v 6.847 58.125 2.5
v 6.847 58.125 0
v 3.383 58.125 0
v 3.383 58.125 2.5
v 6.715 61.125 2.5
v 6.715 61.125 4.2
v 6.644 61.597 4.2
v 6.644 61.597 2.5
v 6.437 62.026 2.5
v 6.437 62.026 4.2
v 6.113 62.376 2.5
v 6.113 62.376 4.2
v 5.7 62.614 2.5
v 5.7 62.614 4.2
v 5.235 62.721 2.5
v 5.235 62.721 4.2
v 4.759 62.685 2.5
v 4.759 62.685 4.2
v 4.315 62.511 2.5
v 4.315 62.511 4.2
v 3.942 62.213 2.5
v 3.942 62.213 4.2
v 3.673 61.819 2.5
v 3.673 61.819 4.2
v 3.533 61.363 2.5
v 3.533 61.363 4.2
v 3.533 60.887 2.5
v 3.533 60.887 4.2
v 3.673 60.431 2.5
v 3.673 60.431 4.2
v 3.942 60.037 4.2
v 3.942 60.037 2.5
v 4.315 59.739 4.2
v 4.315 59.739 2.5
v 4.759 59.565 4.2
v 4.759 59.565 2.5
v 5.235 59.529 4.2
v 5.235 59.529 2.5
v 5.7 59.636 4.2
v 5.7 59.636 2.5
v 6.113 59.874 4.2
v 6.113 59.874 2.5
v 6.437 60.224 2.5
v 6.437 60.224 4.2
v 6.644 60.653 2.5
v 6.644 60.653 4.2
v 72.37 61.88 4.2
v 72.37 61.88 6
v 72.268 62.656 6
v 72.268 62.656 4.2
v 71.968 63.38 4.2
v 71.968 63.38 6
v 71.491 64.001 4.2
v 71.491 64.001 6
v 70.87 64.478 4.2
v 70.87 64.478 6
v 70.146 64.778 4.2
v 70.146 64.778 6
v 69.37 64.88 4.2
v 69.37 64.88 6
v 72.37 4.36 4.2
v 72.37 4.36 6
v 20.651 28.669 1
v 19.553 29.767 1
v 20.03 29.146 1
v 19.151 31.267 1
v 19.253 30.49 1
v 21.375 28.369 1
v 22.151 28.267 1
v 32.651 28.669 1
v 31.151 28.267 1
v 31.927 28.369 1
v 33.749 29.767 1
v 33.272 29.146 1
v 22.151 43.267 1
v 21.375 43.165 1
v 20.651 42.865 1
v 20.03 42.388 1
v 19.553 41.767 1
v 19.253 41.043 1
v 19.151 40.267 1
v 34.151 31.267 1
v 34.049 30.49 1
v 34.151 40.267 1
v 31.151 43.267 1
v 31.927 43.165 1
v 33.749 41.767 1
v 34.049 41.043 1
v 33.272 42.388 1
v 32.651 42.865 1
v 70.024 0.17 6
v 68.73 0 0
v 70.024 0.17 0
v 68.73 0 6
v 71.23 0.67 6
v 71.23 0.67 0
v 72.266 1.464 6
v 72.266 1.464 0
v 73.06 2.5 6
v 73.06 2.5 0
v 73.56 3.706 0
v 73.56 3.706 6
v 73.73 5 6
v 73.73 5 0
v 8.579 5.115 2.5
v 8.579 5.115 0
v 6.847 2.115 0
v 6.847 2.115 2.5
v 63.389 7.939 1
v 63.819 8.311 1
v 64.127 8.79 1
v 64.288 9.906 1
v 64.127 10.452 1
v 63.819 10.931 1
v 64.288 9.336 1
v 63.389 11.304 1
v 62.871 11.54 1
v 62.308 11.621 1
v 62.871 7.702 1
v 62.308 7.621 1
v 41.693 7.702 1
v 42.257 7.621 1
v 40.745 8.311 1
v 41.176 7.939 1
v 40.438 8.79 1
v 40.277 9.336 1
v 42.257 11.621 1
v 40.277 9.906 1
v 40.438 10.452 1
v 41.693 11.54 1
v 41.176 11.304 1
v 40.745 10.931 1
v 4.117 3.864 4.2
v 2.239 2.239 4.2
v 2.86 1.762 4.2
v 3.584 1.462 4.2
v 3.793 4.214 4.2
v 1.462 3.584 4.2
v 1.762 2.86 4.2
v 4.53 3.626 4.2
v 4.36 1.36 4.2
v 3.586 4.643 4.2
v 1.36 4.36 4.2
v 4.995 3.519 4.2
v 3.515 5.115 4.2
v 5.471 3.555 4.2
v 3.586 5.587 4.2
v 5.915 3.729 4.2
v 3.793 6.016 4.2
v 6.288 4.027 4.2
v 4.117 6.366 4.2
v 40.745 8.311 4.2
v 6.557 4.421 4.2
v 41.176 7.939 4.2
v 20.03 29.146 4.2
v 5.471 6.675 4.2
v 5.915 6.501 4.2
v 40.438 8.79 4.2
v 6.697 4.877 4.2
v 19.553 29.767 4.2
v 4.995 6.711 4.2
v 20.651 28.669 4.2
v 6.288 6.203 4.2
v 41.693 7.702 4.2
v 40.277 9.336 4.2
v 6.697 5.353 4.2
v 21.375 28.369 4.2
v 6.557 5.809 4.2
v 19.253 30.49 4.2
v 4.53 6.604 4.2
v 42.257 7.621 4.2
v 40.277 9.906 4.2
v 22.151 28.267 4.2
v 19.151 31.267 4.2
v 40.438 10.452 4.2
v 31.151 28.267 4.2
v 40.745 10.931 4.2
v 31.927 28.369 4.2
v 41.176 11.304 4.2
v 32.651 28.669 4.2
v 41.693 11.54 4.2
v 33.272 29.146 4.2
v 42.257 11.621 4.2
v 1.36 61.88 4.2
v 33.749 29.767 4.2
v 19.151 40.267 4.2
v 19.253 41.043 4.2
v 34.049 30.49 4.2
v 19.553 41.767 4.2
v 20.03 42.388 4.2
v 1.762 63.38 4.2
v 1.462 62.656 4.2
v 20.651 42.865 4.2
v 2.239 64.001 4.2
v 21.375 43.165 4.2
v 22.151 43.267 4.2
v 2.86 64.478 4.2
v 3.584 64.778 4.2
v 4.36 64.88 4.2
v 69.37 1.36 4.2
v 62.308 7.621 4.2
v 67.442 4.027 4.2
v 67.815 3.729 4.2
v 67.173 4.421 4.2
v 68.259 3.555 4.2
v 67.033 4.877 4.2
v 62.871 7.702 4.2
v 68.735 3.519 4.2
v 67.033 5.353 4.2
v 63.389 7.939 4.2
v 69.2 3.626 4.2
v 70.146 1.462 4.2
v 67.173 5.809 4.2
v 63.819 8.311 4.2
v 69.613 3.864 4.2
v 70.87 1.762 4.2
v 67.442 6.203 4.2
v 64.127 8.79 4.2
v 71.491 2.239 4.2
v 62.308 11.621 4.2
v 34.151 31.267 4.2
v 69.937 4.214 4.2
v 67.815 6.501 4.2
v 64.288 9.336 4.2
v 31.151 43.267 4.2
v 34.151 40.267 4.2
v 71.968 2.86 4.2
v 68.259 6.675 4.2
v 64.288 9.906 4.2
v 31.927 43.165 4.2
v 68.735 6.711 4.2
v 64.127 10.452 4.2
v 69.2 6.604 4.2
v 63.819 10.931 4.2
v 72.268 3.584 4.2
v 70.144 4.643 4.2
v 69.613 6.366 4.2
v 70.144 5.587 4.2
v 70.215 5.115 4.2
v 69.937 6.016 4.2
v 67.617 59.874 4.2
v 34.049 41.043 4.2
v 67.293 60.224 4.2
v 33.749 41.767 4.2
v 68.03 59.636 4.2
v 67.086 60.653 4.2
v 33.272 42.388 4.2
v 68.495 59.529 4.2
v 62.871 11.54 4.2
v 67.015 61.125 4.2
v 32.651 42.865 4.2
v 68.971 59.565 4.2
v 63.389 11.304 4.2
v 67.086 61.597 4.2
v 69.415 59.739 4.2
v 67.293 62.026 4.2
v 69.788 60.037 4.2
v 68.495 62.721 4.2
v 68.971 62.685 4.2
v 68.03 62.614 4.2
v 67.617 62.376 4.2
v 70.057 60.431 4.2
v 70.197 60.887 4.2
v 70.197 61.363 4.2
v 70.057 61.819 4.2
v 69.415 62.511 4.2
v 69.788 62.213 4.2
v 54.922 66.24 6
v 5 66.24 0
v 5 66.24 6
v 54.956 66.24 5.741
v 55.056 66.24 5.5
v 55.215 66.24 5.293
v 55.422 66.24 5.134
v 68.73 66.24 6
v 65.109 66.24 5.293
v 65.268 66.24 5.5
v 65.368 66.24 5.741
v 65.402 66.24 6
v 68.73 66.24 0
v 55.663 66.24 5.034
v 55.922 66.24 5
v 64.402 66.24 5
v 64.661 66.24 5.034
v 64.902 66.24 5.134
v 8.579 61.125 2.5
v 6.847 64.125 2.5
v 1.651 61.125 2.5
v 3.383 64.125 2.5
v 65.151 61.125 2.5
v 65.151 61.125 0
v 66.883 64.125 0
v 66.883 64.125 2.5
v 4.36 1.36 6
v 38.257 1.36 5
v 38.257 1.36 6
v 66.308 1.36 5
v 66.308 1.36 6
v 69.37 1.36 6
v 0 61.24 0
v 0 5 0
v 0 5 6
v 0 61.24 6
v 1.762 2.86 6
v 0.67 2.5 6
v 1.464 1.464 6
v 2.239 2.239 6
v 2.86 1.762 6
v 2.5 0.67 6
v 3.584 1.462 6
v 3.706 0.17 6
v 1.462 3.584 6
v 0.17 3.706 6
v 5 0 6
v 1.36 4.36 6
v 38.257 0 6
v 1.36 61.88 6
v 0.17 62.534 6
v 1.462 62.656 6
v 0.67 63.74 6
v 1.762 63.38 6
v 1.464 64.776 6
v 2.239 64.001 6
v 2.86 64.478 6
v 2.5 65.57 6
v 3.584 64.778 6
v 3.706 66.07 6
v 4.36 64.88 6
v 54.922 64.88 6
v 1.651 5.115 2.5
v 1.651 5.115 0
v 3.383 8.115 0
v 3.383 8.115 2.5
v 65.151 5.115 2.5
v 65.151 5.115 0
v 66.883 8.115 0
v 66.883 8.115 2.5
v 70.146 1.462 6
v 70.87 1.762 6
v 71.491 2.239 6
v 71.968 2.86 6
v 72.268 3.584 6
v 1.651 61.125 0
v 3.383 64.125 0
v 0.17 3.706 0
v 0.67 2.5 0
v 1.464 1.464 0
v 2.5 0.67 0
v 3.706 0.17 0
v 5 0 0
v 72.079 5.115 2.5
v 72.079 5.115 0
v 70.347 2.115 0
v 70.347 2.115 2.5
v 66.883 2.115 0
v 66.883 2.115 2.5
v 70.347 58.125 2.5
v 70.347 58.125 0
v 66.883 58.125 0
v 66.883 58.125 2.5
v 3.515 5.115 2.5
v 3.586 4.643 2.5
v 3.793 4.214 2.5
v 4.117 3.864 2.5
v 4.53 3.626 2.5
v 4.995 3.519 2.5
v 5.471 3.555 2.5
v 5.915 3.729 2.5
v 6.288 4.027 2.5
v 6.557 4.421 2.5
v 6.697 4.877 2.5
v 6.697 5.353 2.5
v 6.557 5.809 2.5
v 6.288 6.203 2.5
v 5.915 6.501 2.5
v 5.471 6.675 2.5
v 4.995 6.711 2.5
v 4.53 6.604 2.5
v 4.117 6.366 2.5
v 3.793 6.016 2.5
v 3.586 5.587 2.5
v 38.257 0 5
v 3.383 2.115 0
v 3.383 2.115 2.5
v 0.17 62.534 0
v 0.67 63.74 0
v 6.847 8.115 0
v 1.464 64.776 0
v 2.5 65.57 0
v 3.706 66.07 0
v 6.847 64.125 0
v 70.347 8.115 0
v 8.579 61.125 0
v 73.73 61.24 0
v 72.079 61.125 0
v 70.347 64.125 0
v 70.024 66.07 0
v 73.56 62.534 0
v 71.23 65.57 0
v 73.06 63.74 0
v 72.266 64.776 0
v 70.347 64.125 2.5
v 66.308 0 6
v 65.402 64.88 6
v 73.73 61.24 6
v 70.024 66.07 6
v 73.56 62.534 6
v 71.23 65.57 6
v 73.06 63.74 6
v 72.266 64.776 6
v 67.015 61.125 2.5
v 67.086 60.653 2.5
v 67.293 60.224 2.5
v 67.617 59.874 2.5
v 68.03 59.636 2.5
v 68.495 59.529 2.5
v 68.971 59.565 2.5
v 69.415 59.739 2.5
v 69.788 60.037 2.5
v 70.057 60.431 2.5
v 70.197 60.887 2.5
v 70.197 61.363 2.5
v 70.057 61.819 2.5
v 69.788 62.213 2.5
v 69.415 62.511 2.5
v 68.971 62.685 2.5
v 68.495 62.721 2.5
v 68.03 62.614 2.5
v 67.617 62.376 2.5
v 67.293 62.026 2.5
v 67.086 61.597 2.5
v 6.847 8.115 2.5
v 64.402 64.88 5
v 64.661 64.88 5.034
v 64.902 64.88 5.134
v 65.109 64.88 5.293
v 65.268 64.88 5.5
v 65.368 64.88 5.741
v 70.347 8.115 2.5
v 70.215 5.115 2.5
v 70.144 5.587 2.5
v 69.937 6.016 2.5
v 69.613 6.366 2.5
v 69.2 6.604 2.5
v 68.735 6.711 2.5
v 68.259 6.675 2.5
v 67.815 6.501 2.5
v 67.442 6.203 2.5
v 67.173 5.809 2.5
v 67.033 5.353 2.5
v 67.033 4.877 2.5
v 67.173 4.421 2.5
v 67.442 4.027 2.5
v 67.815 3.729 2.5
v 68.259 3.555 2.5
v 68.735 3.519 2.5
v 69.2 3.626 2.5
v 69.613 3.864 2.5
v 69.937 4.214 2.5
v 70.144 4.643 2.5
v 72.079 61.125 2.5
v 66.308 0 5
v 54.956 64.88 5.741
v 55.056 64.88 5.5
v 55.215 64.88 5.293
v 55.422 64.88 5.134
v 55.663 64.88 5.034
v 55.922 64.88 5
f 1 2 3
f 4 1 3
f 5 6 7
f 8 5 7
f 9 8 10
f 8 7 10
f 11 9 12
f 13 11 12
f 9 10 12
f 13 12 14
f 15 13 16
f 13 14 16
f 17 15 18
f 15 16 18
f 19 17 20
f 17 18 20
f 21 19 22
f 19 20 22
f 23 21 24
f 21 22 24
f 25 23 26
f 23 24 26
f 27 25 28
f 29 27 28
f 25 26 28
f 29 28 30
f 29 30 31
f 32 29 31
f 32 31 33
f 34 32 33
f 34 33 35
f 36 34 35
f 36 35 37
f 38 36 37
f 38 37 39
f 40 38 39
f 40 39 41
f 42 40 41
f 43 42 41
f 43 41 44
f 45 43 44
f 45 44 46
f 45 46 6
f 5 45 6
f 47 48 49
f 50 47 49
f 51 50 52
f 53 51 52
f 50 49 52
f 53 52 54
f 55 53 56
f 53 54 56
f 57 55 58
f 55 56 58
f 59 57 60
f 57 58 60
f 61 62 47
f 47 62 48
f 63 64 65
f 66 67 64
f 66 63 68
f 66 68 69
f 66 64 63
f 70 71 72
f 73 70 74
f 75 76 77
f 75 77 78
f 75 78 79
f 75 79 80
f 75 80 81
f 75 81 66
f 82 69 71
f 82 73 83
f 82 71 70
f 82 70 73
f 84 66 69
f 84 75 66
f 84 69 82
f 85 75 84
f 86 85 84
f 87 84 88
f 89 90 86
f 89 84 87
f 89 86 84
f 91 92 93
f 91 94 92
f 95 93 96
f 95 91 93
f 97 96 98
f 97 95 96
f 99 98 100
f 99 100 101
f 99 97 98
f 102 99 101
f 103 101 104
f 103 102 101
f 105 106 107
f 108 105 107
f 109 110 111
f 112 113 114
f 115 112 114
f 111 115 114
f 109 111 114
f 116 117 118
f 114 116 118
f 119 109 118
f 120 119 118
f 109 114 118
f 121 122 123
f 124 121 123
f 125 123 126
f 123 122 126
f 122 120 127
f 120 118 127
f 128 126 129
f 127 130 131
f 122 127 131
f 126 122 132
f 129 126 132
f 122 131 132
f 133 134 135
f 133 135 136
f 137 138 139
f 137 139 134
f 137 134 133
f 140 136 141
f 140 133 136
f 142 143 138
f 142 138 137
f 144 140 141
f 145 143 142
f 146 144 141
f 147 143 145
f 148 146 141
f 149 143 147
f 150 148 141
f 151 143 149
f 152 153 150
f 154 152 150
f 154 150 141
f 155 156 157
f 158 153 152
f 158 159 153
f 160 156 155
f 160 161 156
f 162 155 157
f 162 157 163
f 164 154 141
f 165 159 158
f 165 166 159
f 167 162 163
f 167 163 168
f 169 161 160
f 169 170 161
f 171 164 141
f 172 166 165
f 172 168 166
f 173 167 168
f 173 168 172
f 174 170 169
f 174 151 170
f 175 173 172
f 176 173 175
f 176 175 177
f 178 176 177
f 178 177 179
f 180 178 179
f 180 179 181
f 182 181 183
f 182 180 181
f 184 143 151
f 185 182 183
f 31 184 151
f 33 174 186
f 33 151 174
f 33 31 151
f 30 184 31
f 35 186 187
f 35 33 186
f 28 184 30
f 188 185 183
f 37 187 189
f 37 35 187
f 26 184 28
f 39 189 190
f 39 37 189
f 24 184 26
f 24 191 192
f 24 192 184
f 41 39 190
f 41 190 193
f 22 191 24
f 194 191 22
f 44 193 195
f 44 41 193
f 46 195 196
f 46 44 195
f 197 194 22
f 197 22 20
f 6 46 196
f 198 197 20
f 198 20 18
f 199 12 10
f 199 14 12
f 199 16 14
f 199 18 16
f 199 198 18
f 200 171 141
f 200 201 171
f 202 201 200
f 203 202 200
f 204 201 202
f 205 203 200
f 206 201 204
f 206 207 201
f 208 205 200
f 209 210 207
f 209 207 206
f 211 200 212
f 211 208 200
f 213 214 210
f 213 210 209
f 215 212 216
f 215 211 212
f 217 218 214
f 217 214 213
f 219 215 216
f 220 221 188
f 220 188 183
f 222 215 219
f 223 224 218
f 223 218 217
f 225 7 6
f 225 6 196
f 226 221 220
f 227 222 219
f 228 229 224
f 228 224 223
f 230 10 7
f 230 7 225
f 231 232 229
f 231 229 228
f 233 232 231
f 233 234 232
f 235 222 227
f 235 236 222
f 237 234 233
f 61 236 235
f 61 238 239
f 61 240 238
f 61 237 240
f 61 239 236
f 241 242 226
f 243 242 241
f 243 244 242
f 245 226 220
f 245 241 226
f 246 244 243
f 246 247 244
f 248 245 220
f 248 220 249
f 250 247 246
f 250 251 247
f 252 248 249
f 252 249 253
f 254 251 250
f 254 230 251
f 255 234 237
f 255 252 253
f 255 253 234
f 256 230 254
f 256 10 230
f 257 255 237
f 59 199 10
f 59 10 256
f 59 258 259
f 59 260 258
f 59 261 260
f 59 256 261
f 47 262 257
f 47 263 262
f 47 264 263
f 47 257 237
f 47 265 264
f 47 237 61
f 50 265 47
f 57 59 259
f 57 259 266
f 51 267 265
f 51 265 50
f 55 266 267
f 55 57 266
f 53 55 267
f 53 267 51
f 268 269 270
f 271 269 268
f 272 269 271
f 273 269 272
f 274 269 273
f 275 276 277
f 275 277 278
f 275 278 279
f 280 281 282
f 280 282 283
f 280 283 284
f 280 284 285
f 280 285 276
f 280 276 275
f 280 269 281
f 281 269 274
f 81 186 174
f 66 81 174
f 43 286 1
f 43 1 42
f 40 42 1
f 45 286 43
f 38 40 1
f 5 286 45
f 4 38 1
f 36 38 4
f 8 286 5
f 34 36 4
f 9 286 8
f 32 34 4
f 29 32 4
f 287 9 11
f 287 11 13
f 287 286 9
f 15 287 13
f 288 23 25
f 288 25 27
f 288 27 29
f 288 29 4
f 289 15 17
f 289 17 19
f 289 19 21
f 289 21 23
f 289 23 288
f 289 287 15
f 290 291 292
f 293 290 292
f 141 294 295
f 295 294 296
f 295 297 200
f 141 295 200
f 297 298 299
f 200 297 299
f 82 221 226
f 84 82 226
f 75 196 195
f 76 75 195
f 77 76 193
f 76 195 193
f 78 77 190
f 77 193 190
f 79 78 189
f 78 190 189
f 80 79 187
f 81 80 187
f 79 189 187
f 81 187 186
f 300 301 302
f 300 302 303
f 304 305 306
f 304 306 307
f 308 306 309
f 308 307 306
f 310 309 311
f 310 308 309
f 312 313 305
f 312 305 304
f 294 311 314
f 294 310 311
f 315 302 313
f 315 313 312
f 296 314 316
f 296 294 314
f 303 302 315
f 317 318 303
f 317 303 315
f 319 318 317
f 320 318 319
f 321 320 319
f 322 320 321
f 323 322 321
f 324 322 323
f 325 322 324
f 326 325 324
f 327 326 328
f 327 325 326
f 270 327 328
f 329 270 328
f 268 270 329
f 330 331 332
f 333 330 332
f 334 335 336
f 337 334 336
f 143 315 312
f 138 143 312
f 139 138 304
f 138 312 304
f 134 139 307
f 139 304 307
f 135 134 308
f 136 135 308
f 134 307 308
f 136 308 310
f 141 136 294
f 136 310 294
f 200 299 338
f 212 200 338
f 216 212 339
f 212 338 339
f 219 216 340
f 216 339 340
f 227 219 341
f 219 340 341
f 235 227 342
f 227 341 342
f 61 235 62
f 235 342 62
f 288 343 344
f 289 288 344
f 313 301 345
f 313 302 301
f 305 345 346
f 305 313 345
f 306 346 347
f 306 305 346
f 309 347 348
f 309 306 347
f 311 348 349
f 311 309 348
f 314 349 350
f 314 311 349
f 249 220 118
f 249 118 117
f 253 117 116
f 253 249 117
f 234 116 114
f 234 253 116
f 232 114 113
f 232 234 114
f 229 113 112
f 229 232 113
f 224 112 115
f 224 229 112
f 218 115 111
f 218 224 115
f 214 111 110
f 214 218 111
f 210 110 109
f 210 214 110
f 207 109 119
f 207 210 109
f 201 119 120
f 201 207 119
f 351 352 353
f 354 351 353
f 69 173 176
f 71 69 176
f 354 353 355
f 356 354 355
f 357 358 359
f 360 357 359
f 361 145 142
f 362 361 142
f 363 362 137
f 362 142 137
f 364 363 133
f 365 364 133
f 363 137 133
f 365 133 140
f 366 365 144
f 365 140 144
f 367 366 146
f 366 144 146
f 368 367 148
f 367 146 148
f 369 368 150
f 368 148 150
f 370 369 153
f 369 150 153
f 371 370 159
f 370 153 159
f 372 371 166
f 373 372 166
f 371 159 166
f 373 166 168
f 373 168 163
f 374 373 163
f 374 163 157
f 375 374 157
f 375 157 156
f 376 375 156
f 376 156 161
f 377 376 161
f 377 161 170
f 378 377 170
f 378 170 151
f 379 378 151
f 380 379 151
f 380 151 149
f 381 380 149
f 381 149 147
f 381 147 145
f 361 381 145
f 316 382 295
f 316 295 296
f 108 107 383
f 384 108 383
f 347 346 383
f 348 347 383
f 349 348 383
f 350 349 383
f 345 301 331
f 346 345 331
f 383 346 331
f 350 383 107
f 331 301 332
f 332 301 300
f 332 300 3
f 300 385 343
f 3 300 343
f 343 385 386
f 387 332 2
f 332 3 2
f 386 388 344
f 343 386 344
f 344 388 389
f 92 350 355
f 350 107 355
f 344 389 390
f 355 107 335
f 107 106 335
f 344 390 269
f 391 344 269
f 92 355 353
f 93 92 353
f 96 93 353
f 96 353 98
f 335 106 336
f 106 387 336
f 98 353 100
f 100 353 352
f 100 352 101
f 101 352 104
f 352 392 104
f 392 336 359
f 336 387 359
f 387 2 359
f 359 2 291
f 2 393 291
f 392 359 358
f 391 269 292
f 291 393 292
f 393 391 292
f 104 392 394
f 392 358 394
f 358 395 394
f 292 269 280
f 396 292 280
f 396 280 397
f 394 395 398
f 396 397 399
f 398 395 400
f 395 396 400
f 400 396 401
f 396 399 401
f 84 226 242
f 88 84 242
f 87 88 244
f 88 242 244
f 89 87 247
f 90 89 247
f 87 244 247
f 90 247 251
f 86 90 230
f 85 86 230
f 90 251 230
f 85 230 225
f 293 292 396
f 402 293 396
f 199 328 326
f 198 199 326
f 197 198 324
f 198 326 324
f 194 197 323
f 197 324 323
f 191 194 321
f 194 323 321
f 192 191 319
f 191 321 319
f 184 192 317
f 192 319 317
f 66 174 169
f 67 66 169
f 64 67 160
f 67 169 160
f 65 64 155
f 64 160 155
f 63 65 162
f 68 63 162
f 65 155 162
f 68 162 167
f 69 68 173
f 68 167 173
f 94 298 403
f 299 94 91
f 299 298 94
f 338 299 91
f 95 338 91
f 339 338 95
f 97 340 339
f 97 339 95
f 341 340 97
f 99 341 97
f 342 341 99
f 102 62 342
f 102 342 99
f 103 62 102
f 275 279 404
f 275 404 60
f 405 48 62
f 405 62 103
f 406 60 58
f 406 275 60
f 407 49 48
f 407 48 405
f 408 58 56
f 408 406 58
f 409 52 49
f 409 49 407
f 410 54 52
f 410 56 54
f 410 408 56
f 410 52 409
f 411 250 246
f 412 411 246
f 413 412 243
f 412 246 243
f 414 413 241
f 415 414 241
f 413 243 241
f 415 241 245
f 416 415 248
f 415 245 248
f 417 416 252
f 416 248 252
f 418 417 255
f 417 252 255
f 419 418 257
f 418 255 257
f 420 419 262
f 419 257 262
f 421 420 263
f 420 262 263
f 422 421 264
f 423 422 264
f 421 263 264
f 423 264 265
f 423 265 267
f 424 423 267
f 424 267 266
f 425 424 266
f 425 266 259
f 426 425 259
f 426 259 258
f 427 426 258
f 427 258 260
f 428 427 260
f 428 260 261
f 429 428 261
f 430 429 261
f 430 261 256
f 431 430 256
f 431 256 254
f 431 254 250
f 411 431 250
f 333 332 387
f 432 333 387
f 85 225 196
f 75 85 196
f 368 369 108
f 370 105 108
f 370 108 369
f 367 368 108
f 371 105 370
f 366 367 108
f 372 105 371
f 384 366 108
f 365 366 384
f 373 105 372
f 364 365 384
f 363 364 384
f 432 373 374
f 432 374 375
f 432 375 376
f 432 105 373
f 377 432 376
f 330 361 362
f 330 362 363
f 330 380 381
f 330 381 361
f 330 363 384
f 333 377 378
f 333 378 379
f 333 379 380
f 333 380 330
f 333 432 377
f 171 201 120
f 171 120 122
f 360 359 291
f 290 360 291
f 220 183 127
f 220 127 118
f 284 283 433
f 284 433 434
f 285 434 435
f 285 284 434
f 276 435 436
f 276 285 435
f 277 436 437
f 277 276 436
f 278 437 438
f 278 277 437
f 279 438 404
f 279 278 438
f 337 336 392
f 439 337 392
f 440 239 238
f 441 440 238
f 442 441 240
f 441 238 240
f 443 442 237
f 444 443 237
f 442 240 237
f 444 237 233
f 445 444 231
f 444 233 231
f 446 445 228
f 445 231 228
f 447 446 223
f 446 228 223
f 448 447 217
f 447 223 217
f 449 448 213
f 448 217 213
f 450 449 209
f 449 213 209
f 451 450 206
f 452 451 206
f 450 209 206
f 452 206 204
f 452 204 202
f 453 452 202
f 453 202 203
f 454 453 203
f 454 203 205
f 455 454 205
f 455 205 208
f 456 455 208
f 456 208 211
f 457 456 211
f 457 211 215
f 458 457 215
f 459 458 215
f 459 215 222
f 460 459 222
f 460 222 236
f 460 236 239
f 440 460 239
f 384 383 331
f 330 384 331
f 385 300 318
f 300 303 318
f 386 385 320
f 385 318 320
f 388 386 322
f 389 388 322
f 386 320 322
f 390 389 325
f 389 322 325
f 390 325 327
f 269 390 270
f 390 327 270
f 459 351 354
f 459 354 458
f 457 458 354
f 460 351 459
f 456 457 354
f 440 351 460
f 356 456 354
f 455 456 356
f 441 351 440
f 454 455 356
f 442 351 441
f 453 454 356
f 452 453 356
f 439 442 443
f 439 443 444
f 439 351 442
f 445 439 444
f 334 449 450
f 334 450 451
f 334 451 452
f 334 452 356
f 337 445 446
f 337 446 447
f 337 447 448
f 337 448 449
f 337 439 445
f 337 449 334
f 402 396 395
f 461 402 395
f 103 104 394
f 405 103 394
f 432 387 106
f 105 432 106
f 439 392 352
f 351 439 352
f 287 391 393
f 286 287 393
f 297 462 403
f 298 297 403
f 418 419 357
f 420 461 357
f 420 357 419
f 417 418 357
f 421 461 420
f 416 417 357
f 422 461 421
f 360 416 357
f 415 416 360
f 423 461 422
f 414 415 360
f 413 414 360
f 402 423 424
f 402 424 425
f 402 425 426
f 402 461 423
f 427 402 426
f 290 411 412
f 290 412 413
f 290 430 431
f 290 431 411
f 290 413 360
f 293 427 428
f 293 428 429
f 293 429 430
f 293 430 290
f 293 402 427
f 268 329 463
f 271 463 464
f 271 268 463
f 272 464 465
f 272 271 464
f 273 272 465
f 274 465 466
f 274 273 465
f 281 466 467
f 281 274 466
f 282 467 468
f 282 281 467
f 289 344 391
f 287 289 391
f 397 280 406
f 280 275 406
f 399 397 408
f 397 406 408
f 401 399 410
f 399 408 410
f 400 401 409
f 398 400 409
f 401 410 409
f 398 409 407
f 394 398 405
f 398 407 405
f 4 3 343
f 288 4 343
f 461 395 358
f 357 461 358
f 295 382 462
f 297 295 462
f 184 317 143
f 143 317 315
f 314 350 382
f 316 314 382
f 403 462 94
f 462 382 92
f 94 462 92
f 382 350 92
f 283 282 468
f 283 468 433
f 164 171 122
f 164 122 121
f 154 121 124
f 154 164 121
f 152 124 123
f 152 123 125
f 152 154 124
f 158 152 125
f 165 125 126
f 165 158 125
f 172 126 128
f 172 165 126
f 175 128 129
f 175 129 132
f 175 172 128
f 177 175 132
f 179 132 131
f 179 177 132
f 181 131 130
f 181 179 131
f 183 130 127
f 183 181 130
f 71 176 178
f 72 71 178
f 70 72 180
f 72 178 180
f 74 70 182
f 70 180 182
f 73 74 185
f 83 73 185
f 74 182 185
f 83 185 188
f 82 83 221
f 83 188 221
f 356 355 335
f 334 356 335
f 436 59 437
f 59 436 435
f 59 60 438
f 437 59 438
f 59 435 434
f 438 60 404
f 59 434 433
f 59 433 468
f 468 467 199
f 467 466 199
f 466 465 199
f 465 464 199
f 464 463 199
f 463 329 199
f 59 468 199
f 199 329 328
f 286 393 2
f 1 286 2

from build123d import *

# Parameters (mm, degrees)
SKETCH_1_W          = 73.73
SKETCH_1_H          = 66.24
EXTRUDE_1_DEPTH     = 6
CUT_EXTRUDE_1_DEPTH = 1.8
SKETCH_5_R          = 1.6
CUT_EXTRUDE_2_DEPTH = 100.204286702
CUT_EXTRUDE_3_DEPTH = 3.2
CUT_EXTRUDE_7_DEPTH = 9
SKETCH_11_W         = 28.050882838
SKETCH_11_H         = 1
CUT_EXTRUDE_8_DEPTH = 9
FILLET_1_R          = 5
CUT_EXTRUDE_9_DEPTH = 2.5


with BuildPart() as part:
    # 草图1 → 凸台-拉伸1 (new body)
    with BuildSketch(Plane.XY):
        with Locations((36.865, 33.12)):
            Rectangle(SKETCH_1_W, SKETCH_1_H)
    extrude(amount=EXTRUDE_1_DEPTH)

    # 草图2 → 切除-拉伸1 (cut)
    with BuildSketch(Plane.XY.offset(6)):
        with BuildLine():
            Line((4.36, 1.36), (69.37, 1.36))
            ThreePointArc((69.37, 1.36), (71.491320344, 2.238679656), (72.37, 4.36))
            Line((72.37, 4.36), (72.37, 61.88))
            ThreePointArc((72.37, 61.88), (71.491320344, 64.001320344), (69.37, 64.88))
            Line((69.37, 64.88), (4.36, 64.88))
            ThreePointArc((4.36, 64.88), (2.238679656, 64.001320344), (1.36, 61.88))
            Line((1.36, 61.88), (1.36, 4.36))
            ThreePointArc((1.36, 4.36), (2.238679656, 2.238679656), (4.36, 1.36))
        make_face()
    extrude(amount=-CUT_EXTRUDE_1_DEPTH, mode=Mode.SUBTRACT)

    # 草图5 → 切除-拉伸2 (cut, through all)
    with BuildSketch(Plane.XY.offset(4.2)):
        with Locations((5.115, 61.125)):
            Circle(SKETCH_5_R)
        with Locations(Location((68.615, 61.125, 0), (0, 0, 180))):
            Circle(SKETCH_5_R)
        with Locations((68.615, 5.115)):
            Circle(SKETCH_5_R)
        with Locations(Location((5.115, 5.115, 0), (0, 0, 180))):
            Circle(SKETCH_5_R)
    extrude(amount=-CUT_EXTRUDE_2_DEPTH, mode=Mode.SUBTRACT)

    # 草图6 → 切除-拉伸3 (cut)
    with BuildSketch(Plane.XY.offset(4.2)):
        with BuildLine():
            Line((62.307968064, 7.621116118), (42.256964224, 7.621116118))
            ThreePointArc((42.256964224, 7.621116118), (40.256964224, 9.621116118), (42.256964224, 11.621116118))
            Line((42.256964224, 11.621116118), (62.307968064, 11.621116118))
            ThreePointArc((62.307968064, 11.621116118), (64.307968064, 9.621116118), (62.307968064, 7.621116118))
        make_face()
        with BuildLine():
            Line((31.151031925, 43.266827275), (22.151031925, 43.266827275))
            ThreePointArc((22.151031925, 43.266827275), (20.029711582, 42.388147618), (19.151031925, 40.266827275))
            Line((19.151031925, 40.266827275), (19.151031925, 31.266827275))
            ThreePointArc((19.151031925, 31.266827275), (20.029711582, 29.145506931), (22.151031925, 28.266827275))
            Line((22.151031925, 28.266827275), (31.151031925, 28.266827275))
            ThreePointArc((31.151031925, 28.266827275), (33.272352269, 29.145506931), (34.151031925, 31.266827275))
            Line((34.151031925, 31.266827275), (34.151031925, 40.266827275))
            ThreePointArc((34.151031925, 40.266827275), (33.272352269, 42.388147618), (31.151031925, 43.266827275))
        make_face()
    extrude(amount=-CUT_EXTRUDE_3_DEPTH, mode=Mode.SUBTRACT)

    # 草图10 → 切除-拉伸7 (cut)
    with BuildSketch(Plane(origin=(0, 66.24, 0), x_dir=(1, 0, 0), z_dir=(0, 1, 0))):
        with BuildLine():
            Line((55.921832213, -5), (64.401832207, -5))
            ThreePointArc((64.401832207, -5), (65.108938988, -5.292893219), (65.401832207, -6))
            Line((65.401832207, -6), (54.921832213, -6))
            ThreePointArc((54.921832213, -6), (55.214725431, -5.292893219), (55.921832213, -5))
        make_face()
    extrude(amount=-CUT_EXTRUDE_7_DEPTH, mode=Mode.SUBTRACT)

    # 草图11 → 切除-拉伸8 (cut)
    with BuildSketch(Plane.XZ):
        with Locations((52.282673484, 5.5)):
            Rectangle(SKETCH_11_W, SKETCH_11_H)
    extrude(amount=-CUT_EXTRUDE_8_DEPTH, mode=Mode.SUBTRACT)

    # 圆角1
    fillet_1_edges = [part.edges().sort_by_distance(p)[0] for p in [
        (0, 66.24, 3),
        (73.73, 66.24, 3),
        (73.73, 0, 3),
        (0, 0, 3),
    ]]
    fillet(fillet_1_edges, radius=FILLET_1_R)

    # 草图12 → 切除-拉伸9 (cut)
    with BuildSketch(Plane(origin=(0, 0, 0), x_dir=(-1, 0, 0), z_dir=(0, 0, -1))):
        Polygon((-65.150898385, 61.125), (-66.882949192, 64.125), (-70.347050808, 64.125), (-72.079101615, 61.125), (-70.347050808, 58.125), (-66.882949192, 58.125), align=None)
        Polygon((-65.150898385, 5.115), (-66.882949192, 8.115), (-70.347050808, 8.115), (-72.079101615, 5.115), (-70.347050808, 2.115), (-66.882949192, 2.115), align=None)
        Polygon((-1.650898385, 5.115), (-3.382949192, 8.115), (-6.847050808, 8.115), (-8.579101615, 5.115), (-6.847050808, 2.115), (-3.382949192, 2.115), align=None)
        Polygon((-1.650898385, 61.125), (-3.382949192, 64.125), (-6.847050808, 64.125), (-8.579101615, 61.125), (-6.847050808, 58.125), (-3.382949192, 58.125), align=None)
    extrude(amount=-CUT_EXTRUDE_9_DEPTH, mode=Mode.SUBTRACT)


solid = part.part
